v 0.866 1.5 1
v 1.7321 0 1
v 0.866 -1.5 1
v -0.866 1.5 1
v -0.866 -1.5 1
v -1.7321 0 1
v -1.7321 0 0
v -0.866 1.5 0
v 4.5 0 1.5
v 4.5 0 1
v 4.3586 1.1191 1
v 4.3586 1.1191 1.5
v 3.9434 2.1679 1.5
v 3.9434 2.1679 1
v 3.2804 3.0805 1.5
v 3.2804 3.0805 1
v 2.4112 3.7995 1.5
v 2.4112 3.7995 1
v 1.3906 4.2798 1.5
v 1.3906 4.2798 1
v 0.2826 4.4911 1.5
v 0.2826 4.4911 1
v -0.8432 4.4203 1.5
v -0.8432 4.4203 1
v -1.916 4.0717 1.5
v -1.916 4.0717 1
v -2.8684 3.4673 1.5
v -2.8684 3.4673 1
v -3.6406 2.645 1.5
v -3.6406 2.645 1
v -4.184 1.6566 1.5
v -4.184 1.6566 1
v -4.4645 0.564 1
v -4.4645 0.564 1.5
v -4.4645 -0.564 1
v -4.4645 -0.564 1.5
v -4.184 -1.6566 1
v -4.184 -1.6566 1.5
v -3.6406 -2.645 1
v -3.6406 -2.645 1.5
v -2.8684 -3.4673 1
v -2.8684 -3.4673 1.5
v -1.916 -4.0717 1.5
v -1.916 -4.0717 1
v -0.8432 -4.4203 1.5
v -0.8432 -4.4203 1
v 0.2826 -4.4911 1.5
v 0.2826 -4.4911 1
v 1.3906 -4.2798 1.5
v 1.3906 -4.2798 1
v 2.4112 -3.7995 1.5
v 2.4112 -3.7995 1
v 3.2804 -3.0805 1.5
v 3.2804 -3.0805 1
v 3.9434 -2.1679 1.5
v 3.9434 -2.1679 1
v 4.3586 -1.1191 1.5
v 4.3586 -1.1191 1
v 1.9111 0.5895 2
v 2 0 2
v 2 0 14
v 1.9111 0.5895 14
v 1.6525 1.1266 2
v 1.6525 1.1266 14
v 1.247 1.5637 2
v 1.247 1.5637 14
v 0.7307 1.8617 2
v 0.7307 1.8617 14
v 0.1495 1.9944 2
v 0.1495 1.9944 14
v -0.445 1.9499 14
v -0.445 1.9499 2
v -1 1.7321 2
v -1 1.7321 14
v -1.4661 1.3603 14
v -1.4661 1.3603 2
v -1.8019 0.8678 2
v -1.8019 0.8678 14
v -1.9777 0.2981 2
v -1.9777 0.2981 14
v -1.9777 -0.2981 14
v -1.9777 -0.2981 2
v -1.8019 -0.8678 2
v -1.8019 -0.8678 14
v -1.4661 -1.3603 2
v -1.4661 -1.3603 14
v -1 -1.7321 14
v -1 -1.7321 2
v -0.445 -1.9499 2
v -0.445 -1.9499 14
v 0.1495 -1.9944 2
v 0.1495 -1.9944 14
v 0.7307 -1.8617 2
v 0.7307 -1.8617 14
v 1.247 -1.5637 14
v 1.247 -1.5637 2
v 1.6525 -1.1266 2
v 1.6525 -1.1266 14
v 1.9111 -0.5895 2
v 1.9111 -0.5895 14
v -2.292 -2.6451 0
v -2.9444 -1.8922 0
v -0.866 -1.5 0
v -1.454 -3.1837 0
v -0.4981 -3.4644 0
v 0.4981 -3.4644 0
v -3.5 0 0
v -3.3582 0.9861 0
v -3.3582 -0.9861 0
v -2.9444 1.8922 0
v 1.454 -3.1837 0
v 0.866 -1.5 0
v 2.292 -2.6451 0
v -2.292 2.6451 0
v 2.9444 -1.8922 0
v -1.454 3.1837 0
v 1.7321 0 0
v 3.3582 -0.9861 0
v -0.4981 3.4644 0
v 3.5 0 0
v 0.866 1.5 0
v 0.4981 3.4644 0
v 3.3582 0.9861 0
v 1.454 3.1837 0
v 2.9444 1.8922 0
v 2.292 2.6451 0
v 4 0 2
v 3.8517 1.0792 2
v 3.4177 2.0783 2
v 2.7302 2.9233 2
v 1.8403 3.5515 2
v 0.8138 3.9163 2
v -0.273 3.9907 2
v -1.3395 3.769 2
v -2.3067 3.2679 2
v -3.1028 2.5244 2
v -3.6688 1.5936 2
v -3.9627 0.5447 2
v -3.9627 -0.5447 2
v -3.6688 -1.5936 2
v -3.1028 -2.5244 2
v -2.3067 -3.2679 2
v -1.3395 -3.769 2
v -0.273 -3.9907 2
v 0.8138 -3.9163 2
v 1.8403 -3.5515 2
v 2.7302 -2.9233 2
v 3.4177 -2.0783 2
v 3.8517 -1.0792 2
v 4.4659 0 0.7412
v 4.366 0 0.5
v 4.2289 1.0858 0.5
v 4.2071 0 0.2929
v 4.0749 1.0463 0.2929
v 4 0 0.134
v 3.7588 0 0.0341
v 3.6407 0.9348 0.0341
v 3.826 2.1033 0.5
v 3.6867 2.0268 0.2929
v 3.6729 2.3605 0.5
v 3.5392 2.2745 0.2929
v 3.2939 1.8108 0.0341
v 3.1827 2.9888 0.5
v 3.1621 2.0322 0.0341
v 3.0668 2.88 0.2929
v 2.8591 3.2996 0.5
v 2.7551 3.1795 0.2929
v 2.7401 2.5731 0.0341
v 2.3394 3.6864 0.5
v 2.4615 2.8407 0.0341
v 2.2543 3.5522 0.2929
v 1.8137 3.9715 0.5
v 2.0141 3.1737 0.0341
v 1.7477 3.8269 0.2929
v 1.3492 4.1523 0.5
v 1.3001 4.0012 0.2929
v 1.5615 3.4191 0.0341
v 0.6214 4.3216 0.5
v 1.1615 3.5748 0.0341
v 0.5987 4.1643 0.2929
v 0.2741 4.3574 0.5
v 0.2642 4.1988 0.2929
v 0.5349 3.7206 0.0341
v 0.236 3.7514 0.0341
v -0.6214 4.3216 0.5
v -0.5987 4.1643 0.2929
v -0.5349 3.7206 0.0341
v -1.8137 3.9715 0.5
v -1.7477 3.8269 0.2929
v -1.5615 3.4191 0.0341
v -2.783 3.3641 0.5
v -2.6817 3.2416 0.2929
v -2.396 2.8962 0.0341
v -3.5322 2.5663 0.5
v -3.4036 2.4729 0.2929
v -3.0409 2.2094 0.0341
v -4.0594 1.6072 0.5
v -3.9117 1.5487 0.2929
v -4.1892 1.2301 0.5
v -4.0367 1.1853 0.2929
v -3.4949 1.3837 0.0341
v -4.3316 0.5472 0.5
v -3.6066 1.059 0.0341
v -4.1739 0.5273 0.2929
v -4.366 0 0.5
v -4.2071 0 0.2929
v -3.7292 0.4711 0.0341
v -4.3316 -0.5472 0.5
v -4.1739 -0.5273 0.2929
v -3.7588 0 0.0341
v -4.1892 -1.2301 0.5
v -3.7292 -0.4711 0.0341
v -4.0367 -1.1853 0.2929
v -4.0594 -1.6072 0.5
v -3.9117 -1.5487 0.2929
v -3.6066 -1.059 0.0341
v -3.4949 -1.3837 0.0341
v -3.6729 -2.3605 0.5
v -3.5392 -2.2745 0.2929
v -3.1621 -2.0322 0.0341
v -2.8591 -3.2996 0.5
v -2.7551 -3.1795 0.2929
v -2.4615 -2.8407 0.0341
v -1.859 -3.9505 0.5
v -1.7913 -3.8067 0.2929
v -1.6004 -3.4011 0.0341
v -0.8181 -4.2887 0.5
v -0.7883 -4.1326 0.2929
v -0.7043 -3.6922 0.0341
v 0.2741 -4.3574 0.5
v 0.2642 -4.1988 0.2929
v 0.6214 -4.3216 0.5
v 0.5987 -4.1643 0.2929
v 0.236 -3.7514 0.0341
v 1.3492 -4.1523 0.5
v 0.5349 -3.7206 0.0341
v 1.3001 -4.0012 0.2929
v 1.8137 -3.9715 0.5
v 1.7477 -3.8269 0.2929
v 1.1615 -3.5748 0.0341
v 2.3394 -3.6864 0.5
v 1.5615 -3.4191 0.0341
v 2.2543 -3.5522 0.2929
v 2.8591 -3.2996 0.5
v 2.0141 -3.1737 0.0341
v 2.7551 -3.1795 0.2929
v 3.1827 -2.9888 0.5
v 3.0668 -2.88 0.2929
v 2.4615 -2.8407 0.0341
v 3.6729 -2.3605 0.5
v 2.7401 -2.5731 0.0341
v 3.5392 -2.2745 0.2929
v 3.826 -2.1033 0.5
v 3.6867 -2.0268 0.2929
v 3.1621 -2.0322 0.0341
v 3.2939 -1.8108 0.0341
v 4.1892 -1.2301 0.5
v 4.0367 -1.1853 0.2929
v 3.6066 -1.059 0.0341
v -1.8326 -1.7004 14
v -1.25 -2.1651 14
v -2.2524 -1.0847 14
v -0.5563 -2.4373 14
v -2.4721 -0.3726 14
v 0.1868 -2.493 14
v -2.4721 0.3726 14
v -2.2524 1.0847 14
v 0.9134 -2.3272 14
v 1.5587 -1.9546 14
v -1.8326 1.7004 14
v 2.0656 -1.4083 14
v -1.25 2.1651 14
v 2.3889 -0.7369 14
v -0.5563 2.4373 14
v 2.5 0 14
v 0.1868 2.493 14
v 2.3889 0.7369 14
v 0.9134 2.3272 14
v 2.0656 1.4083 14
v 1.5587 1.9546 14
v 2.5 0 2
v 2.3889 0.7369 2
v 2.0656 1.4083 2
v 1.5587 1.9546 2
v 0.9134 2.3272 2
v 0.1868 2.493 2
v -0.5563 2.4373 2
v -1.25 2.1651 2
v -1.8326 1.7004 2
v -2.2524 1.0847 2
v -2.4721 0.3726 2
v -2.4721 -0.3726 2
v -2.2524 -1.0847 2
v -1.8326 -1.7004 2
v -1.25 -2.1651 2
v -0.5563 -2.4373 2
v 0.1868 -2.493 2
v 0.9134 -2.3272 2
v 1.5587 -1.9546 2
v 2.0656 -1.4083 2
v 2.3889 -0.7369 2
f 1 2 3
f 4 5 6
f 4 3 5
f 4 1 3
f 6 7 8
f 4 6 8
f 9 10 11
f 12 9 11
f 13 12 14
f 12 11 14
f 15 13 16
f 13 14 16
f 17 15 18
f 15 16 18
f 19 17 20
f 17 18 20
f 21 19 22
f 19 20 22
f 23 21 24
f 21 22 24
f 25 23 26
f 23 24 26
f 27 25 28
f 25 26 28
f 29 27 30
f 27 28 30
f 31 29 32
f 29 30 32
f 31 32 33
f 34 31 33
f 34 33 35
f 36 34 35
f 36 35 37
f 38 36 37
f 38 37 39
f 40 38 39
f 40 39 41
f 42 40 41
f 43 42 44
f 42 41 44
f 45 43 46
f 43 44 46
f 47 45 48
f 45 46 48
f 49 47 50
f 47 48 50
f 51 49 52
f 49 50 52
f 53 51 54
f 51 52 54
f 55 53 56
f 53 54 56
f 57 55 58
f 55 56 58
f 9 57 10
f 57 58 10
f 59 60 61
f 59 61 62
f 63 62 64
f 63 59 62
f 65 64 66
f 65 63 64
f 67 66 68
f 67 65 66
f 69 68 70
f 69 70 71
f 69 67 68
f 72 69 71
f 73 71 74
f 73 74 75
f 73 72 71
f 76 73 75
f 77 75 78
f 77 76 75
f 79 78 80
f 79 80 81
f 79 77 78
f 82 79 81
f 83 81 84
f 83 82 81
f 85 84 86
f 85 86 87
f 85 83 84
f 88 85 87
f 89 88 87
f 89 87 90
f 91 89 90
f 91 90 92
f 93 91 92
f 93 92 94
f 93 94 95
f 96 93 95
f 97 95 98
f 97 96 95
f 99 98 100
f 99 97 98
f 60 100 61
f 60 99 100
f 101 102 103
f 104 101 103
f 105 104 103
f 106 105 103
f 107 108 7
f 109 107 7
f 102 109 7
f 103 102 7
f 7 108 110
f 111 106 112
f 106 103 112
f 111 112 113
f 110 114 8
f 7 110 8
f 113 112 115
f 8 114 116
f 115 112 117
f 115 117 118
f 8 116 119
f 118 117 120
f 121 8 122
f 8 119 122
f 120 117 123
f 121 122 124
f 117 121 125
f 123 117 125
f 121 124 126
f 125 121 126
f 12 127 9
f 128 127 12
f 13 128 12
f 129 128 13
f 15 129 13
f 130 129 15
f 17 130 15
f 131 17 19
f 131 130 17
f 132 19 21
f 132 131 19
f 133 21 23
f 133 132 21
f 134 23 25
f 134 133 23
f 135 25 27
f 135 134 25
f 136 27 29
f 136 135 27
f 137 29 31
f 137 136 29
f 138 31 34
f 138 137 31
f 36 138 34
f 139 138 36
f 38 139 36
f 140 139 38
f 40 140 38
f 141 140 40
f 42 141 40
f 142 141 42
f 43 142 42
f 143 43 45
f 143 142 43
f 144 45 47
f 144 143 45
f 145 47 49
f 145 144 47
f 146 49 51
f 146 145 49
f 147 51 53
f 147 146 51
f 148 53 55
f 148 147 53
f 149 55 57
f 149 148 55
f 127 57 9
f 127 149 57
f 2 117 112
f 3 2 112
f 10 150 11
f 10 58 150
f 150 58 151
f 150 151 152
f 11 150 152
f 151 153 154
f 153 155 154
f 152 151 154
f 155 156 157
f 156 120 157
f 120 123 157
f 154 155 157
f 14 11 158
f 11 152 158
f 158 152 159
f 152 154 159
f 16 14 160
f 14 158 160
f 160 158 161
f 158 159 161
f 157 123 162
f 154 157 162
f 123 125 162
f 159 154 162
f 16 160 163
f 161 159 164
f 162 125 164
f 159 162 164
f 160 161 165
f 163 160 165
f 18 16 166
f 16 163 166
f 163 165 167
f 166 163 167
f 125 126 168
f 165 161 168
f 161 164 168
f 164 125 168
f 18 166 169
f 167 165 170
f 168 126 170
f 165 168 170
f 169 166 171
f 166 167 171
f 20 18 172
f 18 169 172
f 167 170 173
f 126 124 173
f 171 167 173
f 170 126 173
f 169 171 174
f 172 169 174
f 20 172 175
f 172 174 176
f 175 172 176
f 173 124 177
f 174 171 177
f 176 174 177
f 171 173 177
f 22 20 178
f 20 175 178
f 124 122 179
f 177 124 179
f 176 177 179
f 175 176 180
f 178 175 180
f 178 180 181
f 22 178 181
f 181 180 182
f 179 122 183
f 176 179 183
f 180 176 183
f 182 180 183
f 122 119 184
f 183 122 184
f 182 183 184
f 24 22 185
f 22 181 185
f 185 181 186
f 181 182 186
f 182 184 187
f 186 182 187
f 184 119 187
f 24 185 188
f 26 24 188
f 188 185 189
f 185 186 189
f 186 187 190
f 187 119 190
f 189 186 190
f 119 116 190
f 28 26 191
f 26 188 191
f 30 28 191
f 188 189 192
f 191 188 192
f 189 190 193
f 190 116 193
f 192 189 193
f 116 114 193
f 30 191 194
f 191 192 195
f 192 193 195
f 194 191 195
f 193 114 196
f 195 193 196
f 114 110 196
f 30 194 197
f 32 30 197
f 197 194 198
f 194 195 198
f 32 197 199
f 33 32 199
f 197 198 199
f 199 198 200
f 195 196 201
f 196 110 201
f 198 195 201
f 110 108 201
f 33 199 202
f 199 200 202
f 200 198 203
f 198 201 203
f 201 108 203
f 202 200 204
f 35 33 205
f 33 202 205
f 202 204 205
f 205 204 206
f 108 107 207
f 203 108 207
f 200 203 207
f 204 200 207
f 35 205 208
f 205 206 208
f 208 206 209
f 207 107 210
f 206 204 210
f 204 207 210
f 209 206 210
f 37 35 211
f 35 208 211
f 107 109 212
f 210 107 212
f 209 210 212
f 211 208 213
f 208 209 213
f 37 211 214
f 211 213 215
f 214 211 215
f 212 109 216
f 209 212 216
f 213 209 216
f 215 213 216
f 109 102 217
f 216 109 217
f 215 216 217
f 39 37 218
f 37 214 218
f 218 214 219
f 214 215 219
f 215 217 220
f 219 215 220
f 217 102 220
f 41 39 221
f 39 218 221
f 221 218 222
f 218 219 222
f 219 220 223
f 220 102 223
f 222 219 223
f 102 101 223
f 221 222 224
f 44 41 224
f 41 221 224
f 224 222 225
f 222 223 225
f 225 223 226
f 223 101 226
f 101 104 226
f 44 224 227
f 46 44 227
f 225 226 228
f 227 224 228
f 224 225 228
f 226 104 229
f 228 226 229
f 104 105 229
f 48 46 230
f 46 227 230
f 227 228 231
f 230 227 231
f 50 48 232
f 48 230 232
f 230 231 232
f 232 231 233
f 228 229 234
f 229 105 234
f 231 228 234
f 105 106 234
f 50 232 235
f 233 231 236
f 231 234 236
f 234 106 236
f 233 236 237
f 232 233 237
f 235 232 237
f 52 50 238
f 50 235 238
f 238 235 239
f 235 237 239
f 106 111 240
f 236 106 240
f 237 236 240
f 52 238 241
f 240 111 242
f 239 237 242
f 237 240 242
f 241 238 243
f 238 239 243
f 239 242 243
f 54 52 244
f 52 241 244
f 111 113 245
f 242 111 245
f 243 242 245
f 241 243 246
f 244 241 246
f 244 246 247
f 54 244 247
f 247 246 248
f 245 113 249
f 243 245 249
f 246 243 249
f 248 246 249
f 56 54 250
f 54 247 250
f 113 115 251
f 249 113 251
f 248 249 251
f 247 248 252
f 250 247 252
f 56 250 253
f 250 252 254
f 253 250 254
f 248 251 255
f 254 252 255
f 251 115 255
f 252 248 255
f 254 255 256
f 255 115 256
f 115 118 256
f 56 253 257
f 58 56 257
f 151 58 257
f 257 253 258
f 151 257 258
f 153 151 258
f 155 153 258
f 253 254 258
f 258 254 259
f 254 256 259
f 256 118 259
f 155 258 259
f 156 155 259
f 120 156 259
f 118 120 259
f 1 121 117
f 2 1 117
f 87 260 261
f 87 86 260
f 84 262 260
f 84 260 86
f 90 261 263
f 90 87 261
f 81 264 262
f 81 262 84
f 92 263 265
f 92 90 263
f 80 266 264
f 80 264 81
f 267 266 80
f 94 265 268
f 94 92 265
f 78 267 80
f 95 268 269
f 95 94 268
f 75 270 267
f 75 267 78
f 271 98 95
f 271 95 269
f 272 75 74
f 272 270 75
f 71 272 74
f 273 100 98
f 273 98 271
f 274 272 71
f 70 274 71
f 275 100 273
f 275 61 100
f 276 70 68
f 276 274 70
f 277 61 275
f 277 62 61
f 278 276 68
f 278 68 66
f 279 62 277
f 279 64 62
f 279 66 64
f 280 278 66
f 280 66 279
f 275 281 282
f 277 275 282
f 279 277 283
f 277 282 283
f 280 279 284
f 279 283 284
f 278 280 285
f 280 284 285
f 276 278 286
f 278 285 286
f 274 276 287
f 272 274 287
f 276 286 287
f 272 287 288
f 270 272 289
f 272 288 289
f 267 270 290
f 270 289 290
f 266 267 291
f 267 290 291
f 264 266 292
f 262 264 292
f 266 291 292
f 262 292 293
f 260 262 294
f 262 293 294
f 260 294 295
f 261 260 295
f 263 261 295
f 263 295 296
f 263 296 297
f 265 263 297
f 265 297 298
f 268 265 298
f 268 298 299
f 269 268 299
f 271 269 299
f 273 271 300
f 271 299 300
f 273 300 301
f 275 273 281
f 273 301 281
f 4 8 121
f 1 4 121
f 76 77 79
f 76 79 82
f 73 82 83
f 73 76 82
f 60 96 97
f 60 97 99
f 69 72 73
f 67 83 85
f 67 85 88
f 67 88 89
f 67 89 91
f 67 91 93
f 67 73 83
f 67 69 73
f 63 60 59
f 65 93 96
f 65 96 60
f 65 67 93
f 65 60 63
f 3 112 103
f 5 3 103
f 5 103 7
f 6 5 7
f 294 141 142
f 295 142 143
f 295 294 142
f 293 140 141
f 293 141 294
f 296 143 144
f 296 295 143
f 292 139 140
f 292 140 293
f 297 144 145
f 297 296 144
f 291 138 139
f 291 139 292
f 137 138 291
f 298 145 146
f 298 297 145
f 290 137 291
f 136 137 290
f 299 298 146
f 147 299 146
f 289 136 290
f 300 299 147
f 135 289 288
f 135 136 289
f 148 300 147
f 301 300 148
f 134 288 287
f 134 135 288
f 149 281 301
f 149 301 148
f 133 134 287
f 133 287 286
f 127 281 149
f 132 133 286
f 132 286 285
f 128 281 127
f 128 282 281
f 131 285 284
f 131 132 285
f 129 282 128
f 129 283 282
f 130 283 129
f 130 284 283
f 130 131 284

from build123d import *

# Parameters (mm, degrees)
SKETCH_1_R          = 4.5
EXTRUDE_1_DEPTH     = 2
SKETCH_2_R          = 2.5
SKETCH_2_R_2        = 2
EXTRUDE_2_DEPTH     = 12
FILLET_1_R          = 1
CHAMFER_1_SIZE      = 0.5
CUT_EXTRUDE_1_DEPTH = 1


with BuildPart() as part:
    # 草图1 → 凸台-拉伸1 (new body)
    with BuildSketch(Plane.XY):
        Circle(SKETCH_1_R)
    extrude(amount=EXTRUDE_1_DEPTH)

    # 草图2 → 凸台-拉伸2 (add)
    with BuildSketch(Plane.XY.offset(2)):
        Circle(SKETCH_2_R)
        Circle(SKETCH_2_R_2, mode=Mode.SUBTRACT)
    extrude(amount=EXTRUDE_2_DEPTH)

    # 圆角1
    fillet_1_edges = [part.edges().sort_by_distance(p)[0] for p in [
        (-4.5, 0, 0),
    ]]
    fillet(fillet_1_edges, radius=FILLET_1_R)

    # 倒角1
    chamfer_1_edges = [part.edges().sort_by_distance(p)[0] for p in [
        (-4.5, 0, 2),
    ]]
    chamfer(chamfer_1_edges, length=CHAMFER_1_SIZE)

    # 草图3 → 切除-拉伸1 (cut)
    with BuildSketch(Plane(origin=(0, 0, 0), x_dir=(-1, 0, 0), z_dir=(0, 0, -1))):
        Polygon((0.866025404, -1.5), (1.732050808, 0), (0.866025404, 1.5), (-0.866025404, 1.5), (-1.732050808, 0), (-0.866025404, -1.5), align=None)
    extrude(amount=-CUT_EXTRUDE_1_DEPTH, mode=Mode.SUBTRACT)


solid = part.part
